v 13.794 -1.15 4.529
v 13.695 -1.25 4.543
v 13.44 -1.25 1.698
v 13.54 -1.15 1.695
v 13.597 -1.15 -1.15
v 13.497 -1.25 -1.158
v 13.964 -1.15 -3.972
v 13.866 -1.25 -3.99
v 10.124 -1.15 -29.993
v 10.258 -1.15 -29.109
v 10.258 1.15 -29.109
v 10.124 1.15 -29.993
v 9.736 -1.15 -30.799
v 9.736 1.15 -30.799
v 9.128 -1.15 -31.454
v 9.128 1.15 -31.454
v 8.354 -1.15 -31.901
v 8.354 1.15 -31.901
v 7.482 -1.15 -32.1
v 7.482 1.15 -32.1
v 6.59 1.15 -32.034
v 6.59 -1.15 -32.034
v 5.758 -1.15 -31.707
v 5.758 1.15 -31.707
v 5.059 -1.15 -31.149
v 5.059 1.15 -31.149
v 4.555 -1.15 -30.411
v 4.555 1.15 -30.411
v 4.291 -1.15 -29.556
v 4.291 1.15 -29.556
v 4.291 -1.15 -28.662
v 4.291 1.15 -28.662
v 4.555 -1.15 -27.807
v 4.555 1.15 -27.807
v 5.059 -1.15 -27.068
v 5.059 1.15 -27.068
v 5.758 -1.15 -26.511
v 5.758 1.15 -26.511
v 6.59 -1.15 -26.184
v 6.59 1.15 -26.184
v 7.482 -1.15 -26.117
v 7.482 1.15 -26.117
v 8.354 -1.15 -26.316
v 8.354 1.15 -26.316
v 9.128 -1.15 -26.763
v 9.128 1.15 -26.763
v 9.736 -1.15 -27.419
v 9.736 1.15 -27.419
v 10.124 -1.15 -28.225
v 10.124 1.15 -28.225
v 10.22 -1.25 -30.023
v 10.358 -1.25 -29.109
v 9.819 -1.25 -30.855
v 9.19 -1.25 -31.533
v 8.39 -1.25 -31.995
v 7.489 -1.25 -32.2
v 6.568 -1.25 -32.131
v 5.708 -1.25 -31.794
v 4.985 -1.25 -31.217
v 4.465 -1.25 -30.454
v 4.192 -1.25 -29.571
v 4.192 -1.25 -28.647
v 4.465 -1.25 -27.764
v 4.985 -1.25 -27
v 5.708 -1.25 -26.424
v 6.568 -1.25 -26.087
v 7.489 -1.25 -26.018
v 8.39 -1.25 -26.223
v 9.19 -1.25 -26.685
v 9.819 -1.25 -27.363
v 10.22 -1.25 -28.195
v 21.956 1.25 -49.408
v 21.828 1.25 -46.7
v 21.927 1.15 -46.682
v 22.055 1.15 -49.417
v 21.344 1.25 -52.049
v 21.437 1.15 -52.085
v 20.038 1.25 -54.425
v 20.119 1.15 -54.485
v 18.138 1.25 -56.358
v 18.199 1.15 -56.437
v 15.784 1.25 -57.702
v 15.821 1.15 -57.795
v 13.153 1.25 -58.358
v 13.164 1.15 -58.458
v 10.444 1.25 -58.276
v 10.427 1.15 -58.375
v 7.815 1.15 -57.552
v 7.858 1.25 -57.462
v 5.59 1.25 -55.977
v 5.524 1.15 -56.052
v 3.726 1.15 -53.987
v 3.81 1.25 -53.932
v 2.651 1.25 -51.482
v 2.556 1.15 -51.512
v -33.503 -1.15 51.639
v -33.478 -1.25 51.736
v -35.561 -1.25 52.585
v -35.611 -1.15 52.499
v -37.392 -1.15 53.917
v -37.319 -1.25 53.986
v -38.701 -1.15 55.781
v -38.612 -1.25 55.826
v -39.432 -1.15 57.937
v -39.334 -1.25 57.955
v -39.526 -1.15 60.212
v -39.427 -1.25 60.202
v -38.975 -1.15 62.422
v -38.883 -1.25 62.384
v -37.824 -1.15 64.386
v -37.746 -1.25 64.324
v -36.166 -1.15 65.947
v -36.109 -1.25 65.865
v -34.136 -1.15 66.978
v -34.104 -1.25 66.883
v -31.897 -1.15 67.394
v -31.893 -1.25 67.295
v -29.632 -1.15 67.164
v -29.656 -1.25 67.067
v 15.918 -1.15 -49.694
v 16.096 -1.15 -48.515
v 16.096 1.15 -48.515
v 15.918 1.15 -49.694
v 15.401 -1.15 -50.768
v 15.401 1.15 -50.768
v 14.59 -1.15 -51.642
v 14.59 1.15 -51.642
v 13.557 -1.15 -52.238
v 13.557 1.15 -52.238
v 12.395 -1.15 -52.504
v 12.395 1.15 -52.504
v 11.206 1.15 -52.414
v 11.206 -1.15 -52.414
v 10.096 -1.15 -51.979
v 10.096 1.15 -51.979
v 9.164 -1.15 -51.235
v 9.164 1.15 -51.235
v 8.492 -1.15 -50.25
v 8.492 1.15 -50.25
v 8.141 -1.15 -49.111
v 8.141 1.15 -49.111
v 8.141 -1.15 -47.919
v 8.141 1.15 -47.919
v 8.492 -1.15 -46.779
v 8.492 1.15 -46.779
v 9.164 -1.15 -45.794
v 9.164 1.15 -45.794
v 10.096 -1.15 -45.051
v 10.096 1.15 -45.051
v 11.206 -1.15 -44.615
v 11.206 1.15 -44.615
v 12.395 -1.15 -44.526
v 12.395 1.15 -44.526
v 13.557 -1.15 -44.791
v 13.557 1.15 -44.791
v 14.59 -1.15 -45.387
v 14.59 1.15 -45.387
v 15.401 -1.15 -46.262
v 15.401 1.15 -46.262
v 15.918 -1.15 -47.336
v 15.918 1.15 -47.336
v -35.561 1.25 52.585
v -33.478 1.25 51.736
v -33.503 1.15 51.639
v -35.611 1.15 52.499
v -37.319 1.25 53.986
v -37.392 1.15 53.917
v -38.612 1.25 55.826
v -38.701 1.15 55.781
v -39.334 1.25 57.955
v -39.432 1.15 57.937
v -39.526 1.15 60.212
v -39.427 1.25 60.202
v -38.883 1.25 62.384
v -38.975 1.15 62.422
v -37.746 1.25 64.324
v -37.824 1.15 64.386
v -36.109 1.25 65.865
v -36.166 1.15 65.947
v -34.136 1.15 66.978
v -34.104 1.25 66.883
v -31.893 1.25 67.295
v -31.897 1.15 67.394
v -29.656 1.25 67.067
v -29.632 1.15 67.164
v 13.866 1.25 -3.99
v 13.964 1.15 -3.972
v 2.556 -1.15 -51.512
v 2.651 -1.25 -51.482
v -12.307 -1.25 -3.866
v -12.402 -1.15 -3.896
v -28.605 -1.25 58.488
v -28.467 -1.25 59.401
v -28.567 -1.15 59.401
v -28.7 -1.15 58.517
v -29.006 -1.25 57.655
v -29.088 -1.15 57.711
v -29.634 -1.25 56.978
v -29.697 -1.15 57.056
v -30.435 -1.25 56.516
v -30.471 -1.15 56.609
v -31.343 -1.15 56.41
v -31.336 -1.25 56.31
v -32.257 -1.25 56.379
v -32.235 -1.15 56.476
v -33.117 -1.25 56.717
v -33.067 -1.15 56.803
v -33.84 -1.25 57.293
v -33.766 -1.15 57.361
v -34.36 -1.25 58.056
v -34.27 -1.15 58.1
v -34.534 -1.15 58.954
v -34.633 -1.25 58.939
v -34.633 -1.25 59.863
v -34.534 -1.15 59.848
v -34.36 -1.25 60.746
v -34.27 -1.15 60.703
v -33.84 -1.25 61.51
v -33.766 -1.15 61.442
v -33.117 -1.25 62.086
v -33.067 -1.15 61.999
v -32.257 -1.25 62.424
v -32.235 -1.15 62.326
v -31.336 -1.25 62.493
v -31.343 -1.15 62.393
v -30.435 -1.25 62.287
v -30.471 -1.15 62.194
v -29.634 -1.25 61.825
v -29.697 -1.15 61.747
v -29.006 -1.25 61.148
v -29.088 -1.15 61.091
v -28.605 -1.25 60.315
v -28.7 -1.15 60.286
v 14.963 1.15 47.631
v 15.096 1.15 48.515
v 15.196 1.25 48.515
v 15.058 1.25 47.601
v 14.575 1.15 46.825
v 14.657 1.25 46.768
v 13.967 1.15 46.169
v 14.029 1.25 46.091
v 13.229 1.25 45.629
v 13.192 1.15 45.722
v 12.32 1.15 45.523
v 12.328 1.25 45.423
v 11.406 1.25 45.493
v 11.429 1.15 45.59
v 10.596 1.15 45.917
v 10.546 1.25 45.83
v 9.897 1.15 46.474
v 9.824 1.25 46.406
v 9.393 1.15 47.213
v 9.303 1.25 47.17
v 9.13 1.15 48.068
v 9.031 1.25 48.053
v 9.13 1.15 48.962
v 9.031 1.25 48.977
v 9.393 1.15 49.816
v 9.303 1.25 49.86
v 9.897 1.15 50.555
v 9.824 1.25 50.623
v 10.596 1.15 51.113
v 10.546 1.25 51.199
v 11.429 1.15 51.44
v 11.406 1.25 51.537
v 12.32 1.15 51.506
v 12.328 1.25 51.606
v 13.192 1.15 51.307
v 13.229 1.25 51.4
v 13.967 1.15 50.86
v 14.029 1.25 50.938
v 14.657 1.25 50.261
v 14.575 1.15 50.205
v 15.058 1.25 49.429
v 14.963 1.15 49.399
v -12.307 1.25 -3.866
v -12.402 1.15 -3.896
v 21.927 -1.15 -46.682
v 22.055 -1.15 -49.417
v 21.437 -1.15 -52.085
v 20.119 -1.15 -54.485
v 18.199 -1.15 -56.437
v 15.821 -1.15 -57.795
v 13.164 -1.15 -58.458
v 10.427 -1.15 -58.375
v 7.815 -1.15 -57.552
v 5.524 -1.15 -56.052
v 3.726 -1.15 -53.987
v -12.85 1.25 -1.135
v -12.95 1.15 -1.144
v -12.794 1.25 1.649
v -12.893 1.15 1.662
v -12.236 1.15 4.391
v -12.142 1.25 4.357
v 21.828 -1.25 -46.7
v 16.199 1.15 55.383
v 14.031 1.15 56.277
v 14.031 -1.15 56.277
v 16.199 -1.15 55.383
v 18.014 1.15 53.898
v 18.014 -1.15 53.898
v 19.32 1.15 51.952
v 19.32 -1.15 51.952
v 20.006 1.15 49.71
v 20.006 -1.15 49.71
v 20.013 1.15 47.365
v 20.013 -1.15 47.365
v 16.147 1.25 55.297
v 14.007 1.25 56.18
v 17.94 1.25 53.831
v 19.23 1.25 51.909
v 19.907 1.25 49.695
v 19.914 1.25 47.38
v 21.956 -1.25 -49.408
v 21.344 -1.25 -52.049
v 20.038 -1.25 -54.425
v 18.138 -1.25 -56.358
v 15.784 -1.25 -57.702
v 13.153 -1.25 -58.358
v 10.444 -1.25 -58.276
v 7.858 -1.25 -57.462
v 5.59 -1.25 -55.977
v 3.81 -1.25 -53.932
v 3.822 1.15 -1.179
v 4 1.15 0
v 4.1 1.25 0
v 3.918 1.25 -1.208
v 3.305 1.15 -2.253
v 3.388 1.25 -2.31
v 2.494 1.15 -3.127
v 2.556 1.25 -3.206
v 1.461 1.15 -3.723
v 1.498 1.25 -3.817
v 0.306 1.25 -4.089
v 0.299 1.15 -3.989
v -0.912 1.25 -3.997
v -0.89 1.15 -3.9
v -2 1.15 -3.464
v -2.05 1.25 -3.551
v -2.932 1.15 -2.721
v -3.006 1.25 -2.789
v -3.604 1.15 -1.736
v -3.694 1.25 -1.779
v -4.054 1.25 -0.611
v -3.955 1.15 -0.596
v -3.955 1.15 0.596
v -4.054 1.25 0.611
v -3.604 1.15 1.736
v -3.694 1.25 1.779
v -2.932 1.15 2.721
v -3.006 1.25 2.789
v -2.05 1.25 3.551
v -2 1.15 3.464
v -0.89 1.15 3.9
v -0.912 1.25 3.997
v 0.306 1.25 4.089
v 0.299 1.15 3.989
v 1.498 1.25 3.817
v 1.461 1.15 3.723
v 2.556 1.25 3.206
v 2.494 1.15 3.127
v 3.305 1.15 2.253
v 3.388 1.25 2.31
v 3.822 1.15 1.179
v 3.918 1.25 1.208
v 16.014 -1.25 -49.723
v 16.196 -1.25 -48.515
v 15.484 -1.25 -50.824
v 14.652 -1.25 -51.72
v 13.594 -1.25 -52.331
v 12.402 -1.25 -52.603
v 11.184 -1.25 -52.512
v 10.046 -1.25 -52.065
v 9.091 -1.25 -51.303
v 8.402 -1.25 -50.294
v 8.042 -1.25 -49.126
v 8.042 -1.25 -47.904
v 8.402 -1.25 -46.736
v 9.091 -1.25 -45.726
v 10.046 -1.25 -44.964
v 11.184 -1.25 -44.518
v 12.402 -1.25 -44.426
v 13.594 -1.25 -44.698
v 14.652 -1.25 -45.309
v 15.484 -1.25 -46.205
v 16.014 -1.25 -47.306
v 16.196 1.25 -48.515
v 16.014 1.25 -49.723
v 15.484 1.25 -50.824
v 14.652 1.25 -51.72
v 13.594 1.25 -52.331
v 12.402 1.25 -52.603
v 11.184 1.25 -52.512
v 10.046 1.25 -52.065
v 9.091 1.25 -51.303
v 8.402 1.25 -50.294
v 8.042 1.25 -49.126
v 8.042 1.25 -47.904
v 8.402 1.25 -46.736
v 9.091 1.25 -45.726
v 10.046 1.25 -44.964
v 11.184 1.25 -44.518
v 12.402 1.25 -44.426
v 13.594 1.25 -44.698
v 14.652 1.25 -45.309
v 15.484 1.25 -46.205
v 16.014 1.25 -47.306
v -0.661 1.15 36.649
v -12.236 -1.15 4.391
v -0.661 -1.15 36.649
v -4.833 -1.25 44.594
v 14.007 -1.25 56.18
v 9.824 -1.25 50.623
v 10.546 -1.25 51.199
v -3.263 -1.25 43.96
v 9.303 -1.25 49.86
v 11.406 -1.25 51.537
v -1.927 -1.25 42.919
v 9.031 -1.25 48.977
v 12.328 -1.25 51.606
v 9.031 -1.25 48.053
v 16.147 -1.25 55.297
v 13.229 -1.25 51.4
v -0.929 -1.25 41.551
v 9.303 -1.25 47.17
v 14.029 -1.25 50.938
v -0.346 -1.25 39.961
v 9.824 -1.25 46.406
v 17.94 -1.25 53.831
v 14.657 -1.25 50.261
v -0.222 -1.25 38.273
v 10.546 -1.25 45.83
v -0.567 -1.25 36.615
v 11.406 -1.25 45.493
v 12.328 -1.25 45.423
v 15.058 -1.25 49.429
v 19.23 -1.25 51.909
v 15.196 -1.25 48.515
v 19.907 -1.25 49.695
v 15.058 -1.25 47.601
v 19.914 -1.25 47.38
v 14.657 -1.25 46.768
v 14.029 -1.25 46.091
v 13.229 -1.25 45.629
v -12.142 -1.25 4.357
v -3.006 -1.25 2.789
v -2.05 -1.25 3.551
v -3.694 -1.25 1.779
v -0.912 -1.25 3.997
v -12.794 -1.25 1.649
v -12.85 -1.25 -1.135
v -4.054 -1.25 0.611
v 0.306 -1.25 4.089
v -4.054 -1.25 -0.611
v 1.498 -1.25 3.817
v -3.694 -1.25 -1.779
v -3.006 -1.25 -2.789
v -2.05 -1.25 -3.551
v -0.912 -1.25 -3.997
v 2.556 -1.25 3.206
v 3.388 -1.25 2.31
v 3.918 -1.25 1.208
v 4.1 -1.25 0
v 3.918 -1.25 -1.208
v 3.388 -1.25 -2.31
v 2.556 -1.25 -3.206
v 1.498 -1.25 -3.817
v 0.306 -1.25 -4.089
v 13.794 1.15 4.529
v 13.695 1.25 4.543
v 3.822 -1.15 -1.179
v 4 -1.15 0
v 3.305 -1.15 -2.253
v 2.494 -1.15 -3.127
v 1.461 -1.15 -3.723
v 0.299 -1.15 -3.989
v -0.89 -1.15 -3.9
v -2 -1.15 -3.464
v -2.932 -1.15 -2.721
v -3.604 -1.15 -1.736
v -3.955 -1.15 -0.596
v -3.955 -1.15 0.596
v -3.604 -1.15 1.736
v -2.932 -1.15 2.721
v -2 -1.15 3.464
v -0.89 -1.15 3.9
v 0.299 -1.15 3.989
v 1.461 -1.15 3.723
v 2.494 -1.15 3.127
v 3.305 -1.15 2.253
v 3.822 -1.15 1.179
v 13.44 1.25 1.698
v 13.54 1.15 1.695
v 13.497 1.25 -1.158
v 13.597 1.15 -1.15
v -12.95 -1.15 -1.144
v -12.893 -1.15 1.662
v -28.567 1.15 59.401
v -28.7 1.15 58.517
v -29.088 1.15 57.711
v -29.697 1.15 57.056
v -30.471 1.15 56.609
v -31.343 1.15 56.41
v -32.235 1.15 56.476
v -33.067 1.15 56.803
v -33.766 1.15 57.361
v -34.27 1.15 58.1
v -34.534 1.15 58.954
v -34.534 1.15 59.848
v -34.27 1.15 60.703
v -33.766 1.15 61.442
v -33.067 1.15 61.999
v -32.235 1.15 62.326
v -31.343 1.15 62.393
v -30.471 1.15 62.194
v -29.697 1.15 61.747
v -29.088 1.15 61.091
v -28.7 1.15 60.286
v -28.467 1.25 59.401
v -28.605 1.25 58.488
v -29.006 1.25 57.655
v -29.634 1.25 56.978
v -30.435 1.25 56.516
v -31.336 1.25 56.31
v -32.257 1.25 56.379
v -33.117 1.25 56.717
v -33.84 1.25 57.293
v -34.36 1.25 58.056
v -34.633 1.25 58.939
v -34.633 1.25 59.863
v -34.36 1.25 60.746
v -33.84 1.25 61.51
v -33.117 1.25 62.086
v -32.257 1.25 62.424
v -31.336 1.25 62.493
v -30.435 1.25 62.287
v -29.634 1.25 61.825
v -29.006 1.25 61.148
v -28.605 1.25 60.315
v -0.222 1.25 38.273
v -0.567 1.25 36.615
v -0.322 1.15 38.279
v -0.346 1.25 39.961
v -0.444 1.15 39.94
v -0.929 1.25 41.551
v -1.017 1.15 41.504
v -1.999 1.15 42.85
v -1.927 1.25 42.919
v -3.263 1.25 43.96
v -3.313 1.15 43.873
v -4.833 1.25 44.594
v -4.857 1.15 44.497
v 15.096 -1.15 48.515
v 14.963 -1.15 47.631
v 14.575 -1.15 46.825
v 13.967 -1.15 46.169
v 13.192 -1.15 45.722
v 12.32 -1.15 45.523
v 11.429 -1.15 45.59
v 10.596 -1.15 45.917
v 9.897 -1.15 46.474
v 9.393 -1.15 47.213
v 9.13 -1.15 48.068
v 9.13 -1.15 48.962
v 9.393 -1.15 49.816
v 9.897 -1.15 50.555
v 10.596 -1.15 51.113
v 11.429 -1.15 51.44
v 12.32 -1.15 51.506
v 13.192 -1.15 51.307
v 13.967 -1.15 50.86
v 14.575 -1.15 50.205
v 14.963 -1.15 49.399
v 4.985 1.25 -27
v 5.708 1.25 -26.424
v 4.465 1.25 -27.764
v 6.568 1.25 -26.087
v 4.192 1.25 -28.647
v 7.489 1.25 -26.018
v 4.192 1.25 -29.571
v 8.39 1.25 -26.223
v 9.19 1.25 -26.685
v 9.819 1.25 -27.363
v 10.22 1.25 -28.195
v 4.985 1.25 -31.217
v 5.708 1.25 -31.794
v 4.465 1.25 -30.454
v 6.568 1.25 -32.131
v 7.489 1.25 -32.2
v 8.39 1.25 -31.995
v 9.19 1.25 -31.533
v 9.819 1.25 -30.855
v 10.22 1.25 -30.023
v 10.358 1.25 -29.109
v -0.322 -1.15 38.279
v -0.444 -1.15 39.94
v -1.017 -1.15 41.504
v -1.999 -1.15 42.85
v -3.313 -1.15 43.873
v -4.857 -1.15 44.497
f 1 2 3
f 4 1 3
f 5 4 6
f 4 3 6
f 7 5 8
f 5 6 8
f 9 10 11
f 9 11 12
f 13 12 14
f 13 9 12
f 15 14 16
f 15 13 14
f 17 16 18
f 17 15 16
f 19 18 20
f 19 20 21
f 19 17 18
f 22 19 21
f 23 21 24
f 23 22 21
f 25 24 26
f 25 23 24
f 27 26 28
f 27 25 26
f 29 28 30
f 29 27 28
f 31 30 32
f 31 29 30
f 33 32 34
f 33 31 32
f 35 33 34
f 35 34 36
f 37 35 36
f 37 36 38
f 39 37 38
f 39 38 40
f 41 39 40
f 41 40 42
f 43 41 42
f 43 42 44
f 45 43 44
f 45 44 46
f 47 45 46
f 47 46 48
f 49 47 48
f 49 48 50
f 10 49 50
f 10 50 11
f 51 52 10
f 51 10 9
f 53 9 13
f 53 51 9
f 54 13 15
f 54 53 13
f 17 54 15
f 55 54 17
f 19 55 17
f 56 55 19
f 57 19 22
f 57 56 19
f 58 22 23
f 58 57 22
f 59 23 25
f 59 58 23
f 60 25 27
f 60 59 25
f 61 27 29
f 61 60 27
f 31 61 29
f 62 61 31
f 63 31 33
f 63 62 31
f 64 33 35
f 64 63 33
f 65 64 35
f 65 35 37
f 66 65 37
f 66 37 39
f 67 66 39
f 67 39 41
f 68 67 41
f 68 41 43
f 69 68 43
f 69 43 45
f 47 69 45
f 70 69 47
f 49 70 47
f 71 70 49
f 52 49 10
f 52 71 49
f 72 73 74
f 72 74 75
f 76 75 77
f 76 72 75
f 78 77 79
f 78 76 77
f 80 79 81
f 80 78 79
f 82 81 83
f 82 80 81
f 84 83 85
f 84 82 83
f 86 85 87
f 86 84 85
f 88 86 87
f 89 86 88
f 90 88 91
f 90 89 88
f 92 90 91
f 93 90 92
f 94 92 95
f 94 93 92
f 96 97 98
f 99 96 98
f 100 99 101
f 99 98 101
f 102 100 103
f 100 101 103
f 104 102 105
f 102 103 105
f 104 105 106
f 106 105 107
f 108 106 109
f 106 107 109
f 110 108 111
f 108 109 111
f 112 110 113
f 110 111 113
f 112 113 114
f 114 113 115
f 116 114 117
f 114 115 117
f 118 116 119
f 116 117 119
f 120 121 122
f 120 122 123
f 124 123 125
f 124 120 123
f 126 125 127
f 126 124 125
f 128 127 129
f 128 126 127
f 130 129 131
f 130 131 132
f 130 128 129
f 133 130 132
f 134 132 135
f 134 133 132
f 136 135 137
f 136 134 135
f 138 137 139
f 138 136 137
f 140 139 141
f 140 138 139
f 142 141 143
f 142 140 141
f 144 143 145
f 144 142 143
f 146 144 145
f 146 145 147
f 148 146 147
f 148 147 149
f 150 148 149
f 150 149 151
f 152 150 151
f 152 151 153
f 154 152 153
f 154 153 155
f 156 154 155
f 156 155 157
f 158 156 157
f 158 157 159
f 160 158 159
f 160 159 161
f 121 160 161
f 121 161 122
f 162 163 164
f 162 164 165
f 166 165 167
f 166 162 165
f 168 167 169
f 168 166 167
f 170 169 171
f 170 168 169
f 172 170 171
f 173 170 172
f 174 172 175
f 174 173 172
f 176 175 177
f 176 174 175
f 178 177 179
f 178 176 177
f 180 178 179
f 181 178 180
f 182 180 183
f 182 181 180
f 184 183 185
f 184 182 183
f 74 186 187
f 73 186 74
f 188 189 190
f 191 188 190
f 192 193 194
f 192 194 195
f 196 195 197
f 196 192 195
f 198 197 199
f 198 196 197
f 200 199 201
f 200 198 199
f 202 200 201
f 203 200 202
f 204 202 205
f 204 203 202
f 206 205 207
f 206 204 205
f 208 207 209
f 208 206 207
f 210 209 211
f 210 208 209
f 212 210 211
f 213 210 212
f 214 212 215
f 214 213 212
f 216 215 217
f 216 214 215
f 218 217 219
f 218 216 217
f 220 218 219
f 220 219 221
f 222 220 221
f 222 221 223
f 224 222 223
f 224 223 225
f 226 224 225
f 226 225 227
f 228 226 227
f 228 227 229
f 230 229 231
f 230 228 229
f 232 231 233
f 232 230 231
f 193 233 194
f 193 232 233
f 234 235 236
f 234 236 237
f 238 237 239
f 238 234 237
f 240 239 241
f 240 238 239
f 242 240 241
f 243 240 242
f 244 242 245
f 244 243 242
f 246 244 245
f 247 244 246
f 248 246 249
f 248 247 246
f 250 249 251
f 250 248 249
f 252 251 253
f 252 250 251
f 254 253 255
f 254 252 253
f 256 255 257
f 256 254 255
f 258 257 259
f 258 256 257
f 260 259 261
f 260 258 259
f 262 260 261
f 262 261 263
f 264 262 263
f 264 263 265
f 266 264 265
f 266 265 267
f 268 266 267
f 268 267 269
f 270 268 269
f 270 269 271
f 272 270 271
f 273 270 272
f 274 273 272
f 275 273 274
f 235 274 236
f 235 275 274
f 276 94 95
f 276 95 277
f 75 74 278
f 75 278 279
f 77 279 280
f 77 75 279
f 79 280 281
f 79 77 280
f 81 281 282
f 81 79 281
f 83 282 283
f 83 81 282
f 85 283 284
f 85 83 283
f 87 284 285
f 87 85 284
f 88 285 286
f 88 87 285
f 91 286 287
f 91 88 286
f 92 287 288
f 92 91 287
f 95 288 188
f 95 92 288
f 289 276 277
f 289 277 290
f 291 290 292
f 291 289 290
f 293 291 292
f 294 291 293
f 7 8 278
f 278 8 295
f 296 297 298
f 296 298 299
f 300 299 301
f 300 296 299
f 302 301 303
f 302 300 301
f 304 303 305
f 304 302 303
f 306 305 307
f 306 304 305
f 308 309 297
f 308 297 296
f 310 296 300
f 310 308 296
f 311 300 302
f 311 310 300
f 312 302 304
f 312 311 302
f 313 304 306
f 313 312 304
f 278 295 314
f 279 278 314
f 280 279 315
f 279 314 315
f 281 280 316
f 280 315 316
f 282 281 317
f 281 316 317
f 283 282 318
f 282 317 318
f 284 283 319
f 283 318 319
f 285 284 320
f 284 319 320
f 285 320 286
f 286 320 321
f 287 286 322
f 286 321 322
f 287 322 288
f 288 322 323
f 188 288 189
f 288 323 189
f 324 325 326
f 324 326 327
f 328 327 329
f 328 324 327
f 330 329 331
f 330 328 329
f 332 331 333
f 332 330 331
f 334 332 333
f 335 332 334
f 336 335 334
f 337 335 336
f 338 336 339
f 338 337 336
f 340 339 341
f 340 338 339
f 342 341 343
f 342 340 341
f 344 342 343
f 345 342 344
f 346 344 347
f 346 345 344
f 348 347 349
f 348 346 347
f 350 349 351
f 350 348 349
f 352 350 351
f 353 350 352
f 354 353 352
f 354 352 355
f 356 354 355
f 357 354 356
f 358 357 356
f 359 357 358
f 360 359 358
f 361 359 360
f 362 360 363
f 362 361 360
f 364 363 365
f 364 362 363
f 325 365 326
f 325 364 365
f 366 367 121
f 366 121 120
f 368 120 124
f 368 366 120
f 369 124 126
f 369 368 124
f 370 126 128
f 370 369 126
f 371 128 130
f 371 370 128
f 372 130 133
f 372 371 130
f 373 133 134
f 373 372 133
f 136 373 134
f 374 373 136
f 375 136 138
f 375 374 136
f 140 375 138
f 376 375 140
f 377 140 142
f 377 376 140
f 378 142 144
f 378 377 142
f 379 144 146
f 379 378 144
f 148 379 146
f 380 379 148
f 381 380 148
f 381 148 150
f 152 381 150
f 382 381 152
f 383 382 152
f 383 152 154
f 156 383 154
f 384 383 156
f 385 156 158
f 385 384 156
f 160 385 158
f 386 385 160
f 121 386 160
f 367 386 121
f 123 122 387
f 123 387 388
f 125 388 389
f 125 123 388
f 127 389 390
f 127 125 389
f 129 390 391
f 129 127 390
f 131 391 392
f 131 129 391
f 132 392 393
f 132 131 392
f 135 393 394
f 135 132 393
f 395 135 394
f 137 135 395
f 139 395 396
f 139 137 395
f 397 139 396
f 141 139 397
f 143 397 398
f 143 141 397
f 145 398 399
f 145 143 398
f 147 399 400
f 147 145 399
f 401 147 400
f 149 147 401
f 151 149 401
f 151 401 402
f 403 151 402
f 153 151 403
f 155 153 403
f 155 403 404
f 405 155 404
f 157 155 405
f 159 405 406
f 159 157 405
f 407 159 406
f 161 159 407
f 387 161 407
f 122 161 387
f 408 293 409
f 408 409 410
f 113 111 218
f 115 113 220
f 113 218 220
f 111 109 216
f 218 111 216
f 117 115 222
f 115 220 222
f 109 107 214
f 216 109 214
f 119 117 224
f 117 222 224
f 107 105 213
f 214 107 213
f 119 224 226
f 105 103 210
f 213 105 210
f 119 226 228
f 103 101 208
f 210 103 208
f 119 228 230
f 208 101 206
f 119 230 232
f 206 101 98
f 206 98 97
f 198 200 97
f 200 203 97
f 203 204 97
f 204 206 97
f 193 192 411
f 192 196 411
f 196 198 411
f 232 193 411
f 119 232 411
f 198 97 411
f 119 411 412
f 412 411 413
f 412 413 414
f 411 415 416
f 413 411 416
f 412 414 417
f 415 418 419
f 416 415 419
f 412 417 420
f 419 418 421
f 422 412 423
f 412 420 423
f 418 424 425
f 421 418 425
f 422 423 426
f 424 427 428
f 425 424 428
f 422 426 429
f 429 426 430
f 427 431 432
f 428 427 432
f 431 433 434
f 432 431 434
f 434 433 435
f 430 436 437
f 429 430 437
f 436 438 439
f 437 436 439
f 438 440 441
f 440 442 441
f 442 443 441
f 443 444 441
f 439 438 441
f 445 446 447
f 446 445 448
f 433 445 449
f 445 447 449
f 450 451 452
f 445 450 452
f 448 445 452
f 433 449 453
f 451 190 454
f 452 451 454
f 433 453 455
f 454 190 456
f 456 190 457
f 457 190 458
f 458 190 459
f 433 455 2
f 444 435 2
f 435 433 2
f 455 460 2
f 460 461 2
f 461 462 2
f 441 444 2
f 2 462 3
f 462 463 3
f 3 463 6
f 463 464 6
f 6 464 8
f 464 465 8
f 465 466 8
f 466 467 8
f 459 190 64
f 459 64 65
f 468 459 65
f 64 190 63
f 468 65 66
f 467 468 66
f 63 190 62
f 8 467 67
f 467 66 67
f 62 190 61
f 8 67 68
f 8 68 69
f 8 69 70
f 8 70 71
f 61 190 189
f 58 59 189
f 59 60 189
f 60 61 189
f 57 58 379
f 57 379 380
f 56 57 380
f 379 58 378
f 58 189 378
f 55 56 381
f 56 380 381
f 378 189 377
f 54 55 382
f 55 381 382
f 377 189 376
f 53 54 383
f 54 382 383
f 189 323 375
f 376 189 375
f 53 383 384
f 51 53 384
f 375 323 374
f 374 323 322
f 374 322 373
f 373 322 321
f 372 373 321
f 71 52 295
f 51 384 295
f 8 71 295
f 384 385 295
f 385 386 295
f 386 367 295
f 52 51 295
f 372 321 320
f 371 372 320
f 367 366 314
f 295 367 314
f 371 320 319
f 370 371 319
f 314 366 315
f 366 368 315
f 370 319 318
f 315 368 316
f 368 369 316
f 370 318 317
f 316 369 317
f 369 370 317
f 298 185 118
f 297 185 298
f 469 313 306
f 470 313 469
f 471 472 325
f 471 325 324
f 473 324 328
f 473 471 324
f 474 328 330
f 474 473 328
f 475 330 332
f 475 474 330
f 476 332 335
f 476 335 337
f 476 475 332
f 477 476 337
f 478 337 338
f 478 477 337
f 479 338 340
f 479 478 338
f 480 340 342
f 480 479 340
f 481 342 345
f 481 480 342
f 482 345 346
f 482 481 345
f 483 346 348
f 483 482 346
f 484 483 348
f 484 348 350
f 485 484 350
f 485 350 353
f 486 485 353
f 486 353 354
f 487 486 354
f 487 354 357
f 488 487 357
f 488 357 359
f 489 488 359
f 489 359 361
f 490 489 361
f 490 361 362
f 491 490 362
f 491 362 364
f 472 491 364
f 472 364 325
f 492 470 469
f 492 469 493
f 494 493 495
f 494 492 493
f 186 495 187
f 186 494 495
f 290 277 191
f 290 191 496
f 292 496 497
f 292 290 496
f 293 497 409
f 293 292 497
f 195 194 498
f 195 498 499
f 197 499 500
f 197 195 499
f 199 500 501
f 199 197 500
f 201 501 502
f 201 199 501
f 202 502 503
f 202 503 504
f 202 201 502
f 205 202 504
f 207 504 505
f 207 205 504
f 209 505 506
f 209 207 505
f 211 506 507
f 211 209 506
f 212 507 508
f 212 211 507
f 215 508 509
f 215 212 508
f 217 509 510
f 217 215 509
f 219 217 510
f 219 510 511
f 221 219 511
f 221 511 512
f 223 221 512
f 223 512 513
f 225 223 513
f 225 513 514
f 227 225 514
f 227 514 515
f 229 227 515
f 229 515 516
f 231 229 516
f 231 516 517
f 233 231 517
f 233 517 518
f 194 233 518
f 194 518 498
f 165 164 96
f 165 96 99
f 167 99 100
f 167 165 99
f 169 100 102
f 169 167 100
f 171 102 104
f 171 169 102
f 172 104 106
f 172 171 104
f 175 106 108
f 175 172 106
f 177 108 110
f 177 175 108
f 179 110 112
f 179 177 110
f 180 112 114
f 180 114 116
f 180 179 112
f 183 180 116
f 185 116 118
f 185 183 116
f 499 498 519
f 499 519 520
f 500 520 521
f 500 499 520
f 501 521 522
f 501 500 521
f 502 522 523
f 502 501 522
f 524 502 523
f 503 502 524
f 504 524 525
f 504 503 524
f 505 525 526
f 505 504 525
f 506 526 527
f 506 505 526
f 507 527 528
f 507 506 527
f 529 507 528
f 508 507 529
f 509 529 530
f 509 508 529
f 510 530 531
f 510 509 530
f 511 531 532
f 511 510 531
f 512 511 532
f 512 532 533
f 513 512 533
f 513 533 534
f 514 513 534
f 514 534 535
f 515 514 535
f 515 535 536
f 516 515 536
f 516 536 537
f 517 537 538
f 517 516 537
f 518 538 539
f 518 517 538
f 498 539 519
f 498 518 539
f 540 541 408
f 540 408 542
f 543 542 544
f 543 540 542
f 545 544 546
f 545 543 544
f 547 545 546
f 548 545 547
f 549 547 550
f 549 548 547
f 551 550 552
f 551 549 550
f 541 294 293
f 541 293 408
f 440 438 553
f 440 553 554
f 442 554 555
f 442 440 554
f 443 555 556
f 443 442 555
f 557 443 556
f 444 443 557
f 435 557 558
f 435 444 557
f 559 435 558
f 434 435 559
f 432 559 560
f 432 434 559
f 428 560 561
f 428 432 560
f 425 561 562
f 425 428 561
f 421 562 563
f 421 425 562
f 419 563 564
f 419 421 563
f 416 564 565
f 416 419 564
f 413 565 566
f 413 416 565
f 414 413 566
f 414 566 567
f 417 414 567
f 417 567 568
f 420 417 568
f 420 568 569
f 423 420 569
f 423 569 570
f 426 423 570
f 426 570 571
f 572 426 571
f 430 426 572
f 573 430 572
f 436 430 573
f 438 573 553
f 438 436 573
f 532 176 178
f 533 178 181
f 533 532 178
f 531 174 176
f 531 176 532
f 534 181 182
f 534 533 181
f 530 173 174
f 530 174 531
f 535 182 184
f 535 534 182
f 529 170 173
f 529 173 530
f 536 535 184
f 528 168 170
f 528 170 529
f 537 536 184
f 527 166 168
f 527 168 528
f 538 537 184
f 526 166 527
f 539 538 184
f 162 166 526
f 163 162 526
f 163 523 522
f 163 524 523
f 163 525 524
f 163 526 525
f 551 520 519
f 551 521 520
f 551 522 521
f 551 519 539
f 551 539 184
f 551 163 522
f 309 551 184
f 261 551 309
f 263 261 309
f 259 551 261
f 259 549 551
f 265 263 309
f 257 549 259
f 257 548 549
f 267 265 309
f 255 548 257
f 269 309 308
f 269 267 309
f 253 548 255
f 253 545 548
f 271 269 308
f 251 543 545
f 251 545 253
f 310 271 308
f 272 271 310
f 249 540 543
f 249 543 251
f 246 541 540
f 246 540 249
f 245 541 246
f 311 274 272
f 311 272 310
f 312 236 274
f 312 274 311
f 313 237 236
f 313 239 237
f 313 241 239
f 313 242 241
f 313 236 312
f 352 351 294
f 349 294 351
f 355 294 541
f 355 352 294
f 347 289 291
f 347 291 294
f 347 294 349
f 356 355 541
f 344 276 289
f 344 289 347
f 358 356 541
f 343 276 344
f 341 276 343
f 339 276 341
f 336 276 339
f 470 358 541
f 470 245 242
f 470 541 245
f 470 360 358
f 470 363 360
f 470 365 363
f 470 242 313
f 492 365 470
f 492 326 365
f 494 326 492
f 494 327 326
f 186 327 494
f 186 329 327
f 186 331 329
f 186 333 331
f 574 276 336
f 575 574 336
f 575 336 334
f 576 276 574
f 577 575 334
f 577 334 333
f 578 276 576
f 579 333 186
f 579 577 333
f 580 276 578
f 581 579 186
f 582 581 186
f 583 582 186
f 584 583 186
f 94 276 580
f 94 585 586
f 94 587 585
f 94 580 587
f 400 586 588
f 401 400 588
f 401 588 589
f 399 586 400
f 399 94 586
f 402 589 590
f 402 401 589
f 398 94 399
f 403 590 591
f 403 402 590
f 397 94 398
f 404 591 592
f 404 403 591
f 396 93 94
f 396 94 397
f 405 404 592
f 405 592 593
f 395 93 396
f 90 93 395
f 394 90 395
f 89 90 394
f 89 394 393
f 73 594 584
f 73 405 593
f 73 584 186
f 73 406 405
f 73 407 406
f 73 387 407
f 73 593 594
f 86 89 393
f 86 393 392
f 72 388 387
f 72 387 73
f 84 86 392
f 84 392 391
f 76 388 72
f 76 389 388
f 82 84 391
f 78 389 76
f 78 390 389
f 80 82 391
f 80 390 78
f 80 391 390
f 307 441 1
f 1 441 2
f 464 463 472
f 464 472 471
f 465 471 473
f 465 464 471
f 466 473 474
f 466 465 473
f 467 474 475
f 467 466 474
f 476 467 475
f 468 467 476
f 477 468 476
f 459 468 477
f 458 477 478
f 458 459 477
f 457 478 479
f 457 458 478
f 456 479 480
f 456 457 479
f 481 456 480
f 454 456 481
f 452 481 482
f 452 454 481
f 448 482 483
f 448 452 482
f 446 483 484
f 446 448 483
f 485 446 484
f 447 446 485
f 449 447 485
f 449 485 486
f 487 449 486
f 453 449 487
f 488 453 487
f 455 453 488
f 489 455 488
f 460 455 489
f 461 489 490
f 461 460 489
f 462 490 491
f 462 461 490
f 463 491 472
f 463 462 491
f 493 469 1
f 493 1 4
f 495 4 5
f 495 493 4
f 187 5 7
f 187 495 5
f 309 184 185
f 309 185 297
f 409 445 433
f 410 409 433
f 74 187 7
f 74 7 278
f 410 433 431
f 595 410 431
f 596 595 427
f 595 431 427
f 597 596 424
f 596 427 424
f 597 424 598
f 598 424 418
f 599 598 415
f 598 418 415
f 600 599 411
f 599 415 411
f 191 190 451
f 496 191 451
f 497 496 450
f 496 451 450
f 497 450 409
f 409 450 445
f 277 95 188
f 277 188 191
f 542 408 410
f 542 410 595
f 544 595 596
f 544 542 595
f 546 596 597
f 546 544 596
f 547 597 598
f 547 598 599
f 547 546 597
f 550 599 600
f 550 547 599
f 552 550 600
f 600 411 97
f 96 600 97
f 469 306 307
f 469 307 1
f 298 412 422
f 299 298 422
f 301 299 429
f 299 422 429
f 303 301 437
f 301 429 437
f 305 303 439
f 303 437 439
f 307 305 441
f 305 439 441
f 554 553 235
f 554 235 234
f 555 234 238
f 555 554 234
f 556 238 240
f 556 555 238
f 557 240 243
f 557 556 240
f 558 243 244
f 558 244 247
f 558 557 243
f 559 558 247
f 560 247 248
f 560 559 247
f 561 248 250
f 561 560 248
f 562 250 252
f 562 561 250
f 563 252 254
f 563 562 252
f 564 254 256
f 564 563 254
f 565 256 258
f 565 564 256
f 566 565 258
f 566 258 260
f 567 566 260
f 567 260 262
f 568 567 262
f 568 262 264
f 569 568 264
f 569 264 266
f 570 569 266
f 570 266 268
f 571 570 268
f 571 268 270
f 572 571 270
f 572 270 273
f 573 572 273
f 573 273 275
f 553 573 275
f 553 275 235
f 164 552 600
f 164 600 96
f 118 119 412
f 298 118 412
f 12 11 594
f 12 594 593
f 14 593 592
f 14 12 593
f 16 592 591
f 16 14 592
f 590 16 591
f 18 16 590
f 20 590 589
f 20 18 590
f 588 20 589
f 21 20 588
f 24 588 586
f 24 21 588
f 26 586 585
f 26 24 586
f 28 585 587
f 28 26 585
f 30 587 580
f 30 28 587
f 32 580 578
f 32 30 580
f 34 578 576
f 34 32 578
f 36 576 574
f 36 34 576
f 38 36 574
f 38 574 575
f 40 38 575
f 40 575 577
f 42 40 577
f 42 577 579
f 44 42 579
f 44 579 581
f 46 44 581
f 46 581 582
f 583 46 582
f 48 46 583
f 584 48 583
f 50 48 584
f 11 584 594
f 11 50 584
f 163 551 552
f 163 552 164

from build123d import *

# Parameters (mm, degrees)
SKETCH1_R           = 4
SKETCH1_R_2         = 3
BOSS_EXTRUDE1_DEPTH = 1.25
CHAMFER1_SIZE       = 0.1


with BuildPart() as part:
    # Sketch1 → Boss-Extrude1 (new body, symmetric)
    with BuildSketch(Plane(origin=(0, 0, 0), x_dir=(1, 0, 0), z_dir=(0, 1, 0))):
        with BuildLine():
            Line((-29.631837738, -67.163637426), (14.031469945, -56.277152124))
            ThreePointArc((14.031469945, -56.277152124), (18.738560702, -52.973221742), (20.01308876, -47.36534892))
            Line((20.01308876, -47.36534892), (13.793825748, -4.528855104))
            ThreePointArc((13.793825748, -4.528855104), (13.529290218, -0.271510867), (13.964419925, 3.971792226))
            Line((13.964419925, 3.971792226), (21.92672411, 46.682103314))
            ThreePointArc((21.92672411, 46.682103314), (14.515313736, 58.217743577), (2.555771725, 51.511824185))
            Line((2.555771725, 51.511824185), (-12.402419972, 3.896149233))
            ThreePointArc((-12.402419972, 3.896149233), (-12.997382983, -0.260836353), (-12.236118289, -4.390604654))
            Line((-12.236118289, -4.390604654), (-0.66120456, -36.648579291))
            ThreePointArc((-0.66120456, -36.648579291), (-1.017383505, -41.503892695), (-4.857112397, -44.496786566))
            Line((-4.857112397, -44.496786566), (-33.502588067, -51.638905806))
            ThreePointArc((-33.502588067, -51.638905806), (-39.329578713, -61.336646781), (-29.631837738, -67.163637426))
        make_face()
        Circle(SKETCH1_R, mode=Mode.SUBTRACT)
        with Locations((12.09609478, 48.514786314)):
            Circle(SKETCH1_R, mode=Mode.SUBTRACT)
        with Locations((7.257656868, 29.108871788)):
            Circle(SKETCH1_R_2, mode=Mode.SUBTRACT)
        with Locations((12.09609478, -48.514786314)):
            Circle(SKETCH1_R_2, mode=Mode.SUBTRACT)
        with Locations((-31.567212902, -59.401271616)):
            Circle(SKETCH1_R_2, mode=Mode.SUBTRACT)
    extrude(amount=BOSS_EXTRUDE1_DEPTH, both=True)

    # Chamfer1
    chamfer1_edges = [part.edges().sort_by_distance(p)[0] for p in [
        (-39.329578713, 1.25, 61.336646781),
        (-6.448661425, -1.25, 20.519591973),
        (-12.997382983, -1.25, 0.260836353),
        (-4.923324123, -1.25, -27.703986709),
        (14.515313736, -1.25, -58.217743577),
        (17.945572018, -1.25, -25.32694777),
        (13.529290218, -1.25, 0.271510867),
        (-7.800183896, 1.25, 61.720394775),
        (16.903457254, -1.25, 25.947102012),
        (18.738560702, -1.25, 52.973221742),
        (-7.800183896, -1.25, 61.720394775),
        (-39.329578713, -1.25, 61.336646781),
        (-19.179850232, -1.25, 48.067846186),
        (-1.017383505, -1.25, 41.503892695),
        (18.738560702, 1.25, 52.973221742),
        (16.903457254, 1.25, 25.947102012),
        (13.529290218, 1.25, 0.271510867),
        (17.945572018, 1.25, -25.32694777),
        (14.515313736, 1.25, -58.217743577),
        (-4, -1.25, 0),
        (-4, 1.25, 0),
        (-4.923324123, 1.25, -27.703986709),
        (8.09609478, -1.25, -48.514786314),
        (8.09609478, 1.25, -48.514786314),
        (-12.997382983, 1.25, 0.260836353),
        (-6.448661425, 1.25, 20.519591973),
        (4.257656868, -1.25, -29.108871788),
        (4.257656868, 1.25, -29.108871788),
        (-1.017383505, 1.25, 41.503892695),
        (9.09609478, -1.25, 48.514786314),
        (9.09609478, 1.25, 48.514786314),
        (-34.567212902, -1.25, 59.401271616),
        (-34.567212902, 1.25, 59.401271616),
        (-19.179850232, 1.25, 48.067846186),
    ]]
    chamfer(chamfer1_edges, length=CHAMFER1_SIZE)


solid = part.part
